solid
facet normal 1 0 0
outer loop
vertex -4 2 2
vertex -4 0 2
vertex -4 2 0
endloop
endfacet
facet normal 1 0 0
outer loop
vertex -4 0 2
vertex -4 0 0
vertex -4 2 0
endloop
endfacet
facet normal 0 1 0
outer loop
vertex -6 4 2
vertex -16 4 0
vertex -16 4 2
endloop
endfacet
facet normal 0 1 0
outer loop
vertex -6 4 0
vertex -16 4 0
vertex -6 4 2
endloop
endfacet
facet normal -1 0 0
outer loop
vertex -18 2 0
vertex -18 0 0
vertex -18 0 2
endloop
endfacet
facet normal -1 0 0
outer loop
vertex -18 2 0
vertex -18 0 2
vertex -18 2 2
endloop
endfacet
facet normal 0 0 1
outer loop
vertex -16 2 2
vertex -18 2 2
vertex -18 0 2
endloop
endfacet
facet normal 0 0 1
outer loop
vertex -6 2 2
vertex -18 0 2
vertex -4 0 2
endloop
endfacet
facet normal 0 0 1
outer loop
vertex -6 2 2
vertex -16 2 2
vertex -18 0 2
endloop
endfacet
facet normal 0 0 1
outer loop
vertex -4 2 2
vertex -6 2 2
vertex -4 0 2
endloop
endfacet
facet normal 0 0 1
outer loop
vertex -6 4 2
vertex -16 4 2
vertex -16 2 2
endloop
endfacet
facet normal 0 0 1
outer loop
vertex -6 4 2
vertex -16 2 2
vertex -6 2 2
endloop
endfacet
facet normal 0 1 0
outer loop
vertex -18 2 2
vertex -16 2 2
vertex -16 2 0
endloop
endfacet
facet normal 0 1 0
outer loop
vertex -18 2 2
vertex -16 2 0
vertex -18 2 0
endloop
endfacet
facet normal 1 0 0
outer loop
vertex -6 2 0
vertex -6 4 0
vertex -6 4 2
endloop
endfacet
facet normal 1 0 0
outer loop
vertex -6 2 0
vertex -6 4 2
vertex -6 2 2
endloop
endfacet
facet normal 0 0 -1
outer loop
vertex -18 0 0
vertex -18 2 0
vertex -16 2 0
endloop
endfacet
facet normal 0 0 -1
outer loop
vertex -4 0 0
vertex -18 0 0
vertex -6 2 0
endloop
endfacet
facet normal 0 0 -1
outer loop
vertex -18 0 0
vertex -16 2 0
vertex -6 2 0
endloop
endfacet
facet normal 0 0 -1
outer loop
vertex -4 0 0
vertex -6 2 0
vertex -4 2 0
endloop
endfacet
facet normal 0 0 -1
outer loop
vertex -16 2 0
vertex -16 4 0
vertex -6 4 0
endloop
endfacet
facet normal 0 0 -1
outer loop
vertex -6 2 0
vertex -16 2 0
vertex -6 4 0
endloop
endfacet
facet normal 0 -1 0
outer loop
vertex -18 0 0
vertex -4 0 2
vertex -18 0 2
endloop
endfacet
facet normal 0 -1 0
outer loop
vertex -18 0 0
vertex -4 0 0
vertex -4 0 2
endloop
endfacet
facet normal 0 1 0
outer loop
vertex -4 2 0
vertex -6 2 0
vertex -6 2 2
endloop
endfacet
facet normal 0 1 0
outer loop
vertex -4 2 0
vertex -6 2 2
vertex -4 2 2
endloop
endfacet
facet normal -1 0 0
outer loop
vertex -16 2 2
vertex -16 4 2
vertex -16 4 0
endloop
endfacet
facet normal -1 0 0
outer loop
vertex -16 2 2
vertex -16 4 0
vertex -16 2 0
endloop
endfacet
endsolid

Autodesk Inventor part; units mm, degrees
ref_plane "YZ Plane" through (0, 0, 0) normal (1, 0, 0) x (0, 1, 0)
ref_plane "XZ Plane" through (0, 0, 0) normal (0, 1, 0) x (-1, 0, 0)
ref_plane "XY Plane" through (0, 0, 0) normal (0, 0, 1) x (1, 0, 0)
sketch "Sketch1" plane through (0, 0, 0) normal (0, 0, 1) x (1, 0, 0)
  line L0 (0, 0) -> (-50, 0)
  line L1 (-50, 0) -> (-50, 2)
  line L2 (-46, 4) -> (-46, 2)
  line L3 (-46, 2) -> (-50, 2)
  line L4 (0, 2) -> (-4, 2)
  line L5 (-4, 2) -> (-4, 4)
  line L6 (-46, 4) -> (-26, 4)
  line L7 (0, 2) -> (0, 0)
  line L8 (-26, 4) -> (-26, 2)
  line L9 (-26, 2) -> (-24, 2)
  line L10 (-24, 2) -> (-24, 4)
  line L11 (-24, 4) -> (-4, 4)
  dimension "d2" = 4
  dimension "d3" = 2
  dimension "d5" = 24
  dimension "d6" = 2
  dimension "d7" = 2
extrude "Extrusion1" add sketch "Sketch1" along normal blind 2
sketch "Sketch2" plane through (0, 0, 2) normal (0, 0, 1) x (1, 0, 0)
  line L0 (-4, 4) -> (-24, 4) projected
  line L1 (-18, 4) -> (-16, 4)
  line L2 (-16, 4) -> (-16, 2)
  line L3 (-16, 2) -> (-18, 2)
  line L4 (-18, 2) -> (-18, 4)
  point P0 (0, 0)
  dimension "d10" = 2
  dimension "d11" = 2
  dimension "d12" = 16
extrude "Extrusion2" cut sketch "Sketch2" against normal blind 2
sketch "Sketch3" plane through (0, 0, 0) normal (0, 0, -1) x (-1, 0, 0)
  line L0 (18, 4) -> (24, 4) projected
  line L1 (50, 2) -> (50, 0) projected
  line L2 (18, 4) -> (50, 4)
  line L3 (50, 4) -> (50, 0)
  line L4 (50, 0) -> (18, 0)
  line L5 (18, 0) -> (18, 4)
  line L6 (0, 2) -> (4, 2) projected
  line L7 (0, 0) -> (0, 2) projected
  line L8 (4, 2) -> (0, 2)
  line L9 (0, 2) -> (0, 0)
  line L10 (0, 0) -> (4, 0)
  line L11 (4, 0) -> (4, 2)
  line L12 (4, 2) -> (4, 4) projected
  line L13 (4, 4) -> (6, 4)
  line L14 (6, 4) -> (6, 2)
  line L15 (6, 2) -> (4, 2)
  line L16 (4, 2) -> (4, 4)
  dimension "d17" = 2
extrude "Extrusion3" cut sketch "Sketch3" against normal blind 10
properties part number "beam1" material "Wood (Birch)"
